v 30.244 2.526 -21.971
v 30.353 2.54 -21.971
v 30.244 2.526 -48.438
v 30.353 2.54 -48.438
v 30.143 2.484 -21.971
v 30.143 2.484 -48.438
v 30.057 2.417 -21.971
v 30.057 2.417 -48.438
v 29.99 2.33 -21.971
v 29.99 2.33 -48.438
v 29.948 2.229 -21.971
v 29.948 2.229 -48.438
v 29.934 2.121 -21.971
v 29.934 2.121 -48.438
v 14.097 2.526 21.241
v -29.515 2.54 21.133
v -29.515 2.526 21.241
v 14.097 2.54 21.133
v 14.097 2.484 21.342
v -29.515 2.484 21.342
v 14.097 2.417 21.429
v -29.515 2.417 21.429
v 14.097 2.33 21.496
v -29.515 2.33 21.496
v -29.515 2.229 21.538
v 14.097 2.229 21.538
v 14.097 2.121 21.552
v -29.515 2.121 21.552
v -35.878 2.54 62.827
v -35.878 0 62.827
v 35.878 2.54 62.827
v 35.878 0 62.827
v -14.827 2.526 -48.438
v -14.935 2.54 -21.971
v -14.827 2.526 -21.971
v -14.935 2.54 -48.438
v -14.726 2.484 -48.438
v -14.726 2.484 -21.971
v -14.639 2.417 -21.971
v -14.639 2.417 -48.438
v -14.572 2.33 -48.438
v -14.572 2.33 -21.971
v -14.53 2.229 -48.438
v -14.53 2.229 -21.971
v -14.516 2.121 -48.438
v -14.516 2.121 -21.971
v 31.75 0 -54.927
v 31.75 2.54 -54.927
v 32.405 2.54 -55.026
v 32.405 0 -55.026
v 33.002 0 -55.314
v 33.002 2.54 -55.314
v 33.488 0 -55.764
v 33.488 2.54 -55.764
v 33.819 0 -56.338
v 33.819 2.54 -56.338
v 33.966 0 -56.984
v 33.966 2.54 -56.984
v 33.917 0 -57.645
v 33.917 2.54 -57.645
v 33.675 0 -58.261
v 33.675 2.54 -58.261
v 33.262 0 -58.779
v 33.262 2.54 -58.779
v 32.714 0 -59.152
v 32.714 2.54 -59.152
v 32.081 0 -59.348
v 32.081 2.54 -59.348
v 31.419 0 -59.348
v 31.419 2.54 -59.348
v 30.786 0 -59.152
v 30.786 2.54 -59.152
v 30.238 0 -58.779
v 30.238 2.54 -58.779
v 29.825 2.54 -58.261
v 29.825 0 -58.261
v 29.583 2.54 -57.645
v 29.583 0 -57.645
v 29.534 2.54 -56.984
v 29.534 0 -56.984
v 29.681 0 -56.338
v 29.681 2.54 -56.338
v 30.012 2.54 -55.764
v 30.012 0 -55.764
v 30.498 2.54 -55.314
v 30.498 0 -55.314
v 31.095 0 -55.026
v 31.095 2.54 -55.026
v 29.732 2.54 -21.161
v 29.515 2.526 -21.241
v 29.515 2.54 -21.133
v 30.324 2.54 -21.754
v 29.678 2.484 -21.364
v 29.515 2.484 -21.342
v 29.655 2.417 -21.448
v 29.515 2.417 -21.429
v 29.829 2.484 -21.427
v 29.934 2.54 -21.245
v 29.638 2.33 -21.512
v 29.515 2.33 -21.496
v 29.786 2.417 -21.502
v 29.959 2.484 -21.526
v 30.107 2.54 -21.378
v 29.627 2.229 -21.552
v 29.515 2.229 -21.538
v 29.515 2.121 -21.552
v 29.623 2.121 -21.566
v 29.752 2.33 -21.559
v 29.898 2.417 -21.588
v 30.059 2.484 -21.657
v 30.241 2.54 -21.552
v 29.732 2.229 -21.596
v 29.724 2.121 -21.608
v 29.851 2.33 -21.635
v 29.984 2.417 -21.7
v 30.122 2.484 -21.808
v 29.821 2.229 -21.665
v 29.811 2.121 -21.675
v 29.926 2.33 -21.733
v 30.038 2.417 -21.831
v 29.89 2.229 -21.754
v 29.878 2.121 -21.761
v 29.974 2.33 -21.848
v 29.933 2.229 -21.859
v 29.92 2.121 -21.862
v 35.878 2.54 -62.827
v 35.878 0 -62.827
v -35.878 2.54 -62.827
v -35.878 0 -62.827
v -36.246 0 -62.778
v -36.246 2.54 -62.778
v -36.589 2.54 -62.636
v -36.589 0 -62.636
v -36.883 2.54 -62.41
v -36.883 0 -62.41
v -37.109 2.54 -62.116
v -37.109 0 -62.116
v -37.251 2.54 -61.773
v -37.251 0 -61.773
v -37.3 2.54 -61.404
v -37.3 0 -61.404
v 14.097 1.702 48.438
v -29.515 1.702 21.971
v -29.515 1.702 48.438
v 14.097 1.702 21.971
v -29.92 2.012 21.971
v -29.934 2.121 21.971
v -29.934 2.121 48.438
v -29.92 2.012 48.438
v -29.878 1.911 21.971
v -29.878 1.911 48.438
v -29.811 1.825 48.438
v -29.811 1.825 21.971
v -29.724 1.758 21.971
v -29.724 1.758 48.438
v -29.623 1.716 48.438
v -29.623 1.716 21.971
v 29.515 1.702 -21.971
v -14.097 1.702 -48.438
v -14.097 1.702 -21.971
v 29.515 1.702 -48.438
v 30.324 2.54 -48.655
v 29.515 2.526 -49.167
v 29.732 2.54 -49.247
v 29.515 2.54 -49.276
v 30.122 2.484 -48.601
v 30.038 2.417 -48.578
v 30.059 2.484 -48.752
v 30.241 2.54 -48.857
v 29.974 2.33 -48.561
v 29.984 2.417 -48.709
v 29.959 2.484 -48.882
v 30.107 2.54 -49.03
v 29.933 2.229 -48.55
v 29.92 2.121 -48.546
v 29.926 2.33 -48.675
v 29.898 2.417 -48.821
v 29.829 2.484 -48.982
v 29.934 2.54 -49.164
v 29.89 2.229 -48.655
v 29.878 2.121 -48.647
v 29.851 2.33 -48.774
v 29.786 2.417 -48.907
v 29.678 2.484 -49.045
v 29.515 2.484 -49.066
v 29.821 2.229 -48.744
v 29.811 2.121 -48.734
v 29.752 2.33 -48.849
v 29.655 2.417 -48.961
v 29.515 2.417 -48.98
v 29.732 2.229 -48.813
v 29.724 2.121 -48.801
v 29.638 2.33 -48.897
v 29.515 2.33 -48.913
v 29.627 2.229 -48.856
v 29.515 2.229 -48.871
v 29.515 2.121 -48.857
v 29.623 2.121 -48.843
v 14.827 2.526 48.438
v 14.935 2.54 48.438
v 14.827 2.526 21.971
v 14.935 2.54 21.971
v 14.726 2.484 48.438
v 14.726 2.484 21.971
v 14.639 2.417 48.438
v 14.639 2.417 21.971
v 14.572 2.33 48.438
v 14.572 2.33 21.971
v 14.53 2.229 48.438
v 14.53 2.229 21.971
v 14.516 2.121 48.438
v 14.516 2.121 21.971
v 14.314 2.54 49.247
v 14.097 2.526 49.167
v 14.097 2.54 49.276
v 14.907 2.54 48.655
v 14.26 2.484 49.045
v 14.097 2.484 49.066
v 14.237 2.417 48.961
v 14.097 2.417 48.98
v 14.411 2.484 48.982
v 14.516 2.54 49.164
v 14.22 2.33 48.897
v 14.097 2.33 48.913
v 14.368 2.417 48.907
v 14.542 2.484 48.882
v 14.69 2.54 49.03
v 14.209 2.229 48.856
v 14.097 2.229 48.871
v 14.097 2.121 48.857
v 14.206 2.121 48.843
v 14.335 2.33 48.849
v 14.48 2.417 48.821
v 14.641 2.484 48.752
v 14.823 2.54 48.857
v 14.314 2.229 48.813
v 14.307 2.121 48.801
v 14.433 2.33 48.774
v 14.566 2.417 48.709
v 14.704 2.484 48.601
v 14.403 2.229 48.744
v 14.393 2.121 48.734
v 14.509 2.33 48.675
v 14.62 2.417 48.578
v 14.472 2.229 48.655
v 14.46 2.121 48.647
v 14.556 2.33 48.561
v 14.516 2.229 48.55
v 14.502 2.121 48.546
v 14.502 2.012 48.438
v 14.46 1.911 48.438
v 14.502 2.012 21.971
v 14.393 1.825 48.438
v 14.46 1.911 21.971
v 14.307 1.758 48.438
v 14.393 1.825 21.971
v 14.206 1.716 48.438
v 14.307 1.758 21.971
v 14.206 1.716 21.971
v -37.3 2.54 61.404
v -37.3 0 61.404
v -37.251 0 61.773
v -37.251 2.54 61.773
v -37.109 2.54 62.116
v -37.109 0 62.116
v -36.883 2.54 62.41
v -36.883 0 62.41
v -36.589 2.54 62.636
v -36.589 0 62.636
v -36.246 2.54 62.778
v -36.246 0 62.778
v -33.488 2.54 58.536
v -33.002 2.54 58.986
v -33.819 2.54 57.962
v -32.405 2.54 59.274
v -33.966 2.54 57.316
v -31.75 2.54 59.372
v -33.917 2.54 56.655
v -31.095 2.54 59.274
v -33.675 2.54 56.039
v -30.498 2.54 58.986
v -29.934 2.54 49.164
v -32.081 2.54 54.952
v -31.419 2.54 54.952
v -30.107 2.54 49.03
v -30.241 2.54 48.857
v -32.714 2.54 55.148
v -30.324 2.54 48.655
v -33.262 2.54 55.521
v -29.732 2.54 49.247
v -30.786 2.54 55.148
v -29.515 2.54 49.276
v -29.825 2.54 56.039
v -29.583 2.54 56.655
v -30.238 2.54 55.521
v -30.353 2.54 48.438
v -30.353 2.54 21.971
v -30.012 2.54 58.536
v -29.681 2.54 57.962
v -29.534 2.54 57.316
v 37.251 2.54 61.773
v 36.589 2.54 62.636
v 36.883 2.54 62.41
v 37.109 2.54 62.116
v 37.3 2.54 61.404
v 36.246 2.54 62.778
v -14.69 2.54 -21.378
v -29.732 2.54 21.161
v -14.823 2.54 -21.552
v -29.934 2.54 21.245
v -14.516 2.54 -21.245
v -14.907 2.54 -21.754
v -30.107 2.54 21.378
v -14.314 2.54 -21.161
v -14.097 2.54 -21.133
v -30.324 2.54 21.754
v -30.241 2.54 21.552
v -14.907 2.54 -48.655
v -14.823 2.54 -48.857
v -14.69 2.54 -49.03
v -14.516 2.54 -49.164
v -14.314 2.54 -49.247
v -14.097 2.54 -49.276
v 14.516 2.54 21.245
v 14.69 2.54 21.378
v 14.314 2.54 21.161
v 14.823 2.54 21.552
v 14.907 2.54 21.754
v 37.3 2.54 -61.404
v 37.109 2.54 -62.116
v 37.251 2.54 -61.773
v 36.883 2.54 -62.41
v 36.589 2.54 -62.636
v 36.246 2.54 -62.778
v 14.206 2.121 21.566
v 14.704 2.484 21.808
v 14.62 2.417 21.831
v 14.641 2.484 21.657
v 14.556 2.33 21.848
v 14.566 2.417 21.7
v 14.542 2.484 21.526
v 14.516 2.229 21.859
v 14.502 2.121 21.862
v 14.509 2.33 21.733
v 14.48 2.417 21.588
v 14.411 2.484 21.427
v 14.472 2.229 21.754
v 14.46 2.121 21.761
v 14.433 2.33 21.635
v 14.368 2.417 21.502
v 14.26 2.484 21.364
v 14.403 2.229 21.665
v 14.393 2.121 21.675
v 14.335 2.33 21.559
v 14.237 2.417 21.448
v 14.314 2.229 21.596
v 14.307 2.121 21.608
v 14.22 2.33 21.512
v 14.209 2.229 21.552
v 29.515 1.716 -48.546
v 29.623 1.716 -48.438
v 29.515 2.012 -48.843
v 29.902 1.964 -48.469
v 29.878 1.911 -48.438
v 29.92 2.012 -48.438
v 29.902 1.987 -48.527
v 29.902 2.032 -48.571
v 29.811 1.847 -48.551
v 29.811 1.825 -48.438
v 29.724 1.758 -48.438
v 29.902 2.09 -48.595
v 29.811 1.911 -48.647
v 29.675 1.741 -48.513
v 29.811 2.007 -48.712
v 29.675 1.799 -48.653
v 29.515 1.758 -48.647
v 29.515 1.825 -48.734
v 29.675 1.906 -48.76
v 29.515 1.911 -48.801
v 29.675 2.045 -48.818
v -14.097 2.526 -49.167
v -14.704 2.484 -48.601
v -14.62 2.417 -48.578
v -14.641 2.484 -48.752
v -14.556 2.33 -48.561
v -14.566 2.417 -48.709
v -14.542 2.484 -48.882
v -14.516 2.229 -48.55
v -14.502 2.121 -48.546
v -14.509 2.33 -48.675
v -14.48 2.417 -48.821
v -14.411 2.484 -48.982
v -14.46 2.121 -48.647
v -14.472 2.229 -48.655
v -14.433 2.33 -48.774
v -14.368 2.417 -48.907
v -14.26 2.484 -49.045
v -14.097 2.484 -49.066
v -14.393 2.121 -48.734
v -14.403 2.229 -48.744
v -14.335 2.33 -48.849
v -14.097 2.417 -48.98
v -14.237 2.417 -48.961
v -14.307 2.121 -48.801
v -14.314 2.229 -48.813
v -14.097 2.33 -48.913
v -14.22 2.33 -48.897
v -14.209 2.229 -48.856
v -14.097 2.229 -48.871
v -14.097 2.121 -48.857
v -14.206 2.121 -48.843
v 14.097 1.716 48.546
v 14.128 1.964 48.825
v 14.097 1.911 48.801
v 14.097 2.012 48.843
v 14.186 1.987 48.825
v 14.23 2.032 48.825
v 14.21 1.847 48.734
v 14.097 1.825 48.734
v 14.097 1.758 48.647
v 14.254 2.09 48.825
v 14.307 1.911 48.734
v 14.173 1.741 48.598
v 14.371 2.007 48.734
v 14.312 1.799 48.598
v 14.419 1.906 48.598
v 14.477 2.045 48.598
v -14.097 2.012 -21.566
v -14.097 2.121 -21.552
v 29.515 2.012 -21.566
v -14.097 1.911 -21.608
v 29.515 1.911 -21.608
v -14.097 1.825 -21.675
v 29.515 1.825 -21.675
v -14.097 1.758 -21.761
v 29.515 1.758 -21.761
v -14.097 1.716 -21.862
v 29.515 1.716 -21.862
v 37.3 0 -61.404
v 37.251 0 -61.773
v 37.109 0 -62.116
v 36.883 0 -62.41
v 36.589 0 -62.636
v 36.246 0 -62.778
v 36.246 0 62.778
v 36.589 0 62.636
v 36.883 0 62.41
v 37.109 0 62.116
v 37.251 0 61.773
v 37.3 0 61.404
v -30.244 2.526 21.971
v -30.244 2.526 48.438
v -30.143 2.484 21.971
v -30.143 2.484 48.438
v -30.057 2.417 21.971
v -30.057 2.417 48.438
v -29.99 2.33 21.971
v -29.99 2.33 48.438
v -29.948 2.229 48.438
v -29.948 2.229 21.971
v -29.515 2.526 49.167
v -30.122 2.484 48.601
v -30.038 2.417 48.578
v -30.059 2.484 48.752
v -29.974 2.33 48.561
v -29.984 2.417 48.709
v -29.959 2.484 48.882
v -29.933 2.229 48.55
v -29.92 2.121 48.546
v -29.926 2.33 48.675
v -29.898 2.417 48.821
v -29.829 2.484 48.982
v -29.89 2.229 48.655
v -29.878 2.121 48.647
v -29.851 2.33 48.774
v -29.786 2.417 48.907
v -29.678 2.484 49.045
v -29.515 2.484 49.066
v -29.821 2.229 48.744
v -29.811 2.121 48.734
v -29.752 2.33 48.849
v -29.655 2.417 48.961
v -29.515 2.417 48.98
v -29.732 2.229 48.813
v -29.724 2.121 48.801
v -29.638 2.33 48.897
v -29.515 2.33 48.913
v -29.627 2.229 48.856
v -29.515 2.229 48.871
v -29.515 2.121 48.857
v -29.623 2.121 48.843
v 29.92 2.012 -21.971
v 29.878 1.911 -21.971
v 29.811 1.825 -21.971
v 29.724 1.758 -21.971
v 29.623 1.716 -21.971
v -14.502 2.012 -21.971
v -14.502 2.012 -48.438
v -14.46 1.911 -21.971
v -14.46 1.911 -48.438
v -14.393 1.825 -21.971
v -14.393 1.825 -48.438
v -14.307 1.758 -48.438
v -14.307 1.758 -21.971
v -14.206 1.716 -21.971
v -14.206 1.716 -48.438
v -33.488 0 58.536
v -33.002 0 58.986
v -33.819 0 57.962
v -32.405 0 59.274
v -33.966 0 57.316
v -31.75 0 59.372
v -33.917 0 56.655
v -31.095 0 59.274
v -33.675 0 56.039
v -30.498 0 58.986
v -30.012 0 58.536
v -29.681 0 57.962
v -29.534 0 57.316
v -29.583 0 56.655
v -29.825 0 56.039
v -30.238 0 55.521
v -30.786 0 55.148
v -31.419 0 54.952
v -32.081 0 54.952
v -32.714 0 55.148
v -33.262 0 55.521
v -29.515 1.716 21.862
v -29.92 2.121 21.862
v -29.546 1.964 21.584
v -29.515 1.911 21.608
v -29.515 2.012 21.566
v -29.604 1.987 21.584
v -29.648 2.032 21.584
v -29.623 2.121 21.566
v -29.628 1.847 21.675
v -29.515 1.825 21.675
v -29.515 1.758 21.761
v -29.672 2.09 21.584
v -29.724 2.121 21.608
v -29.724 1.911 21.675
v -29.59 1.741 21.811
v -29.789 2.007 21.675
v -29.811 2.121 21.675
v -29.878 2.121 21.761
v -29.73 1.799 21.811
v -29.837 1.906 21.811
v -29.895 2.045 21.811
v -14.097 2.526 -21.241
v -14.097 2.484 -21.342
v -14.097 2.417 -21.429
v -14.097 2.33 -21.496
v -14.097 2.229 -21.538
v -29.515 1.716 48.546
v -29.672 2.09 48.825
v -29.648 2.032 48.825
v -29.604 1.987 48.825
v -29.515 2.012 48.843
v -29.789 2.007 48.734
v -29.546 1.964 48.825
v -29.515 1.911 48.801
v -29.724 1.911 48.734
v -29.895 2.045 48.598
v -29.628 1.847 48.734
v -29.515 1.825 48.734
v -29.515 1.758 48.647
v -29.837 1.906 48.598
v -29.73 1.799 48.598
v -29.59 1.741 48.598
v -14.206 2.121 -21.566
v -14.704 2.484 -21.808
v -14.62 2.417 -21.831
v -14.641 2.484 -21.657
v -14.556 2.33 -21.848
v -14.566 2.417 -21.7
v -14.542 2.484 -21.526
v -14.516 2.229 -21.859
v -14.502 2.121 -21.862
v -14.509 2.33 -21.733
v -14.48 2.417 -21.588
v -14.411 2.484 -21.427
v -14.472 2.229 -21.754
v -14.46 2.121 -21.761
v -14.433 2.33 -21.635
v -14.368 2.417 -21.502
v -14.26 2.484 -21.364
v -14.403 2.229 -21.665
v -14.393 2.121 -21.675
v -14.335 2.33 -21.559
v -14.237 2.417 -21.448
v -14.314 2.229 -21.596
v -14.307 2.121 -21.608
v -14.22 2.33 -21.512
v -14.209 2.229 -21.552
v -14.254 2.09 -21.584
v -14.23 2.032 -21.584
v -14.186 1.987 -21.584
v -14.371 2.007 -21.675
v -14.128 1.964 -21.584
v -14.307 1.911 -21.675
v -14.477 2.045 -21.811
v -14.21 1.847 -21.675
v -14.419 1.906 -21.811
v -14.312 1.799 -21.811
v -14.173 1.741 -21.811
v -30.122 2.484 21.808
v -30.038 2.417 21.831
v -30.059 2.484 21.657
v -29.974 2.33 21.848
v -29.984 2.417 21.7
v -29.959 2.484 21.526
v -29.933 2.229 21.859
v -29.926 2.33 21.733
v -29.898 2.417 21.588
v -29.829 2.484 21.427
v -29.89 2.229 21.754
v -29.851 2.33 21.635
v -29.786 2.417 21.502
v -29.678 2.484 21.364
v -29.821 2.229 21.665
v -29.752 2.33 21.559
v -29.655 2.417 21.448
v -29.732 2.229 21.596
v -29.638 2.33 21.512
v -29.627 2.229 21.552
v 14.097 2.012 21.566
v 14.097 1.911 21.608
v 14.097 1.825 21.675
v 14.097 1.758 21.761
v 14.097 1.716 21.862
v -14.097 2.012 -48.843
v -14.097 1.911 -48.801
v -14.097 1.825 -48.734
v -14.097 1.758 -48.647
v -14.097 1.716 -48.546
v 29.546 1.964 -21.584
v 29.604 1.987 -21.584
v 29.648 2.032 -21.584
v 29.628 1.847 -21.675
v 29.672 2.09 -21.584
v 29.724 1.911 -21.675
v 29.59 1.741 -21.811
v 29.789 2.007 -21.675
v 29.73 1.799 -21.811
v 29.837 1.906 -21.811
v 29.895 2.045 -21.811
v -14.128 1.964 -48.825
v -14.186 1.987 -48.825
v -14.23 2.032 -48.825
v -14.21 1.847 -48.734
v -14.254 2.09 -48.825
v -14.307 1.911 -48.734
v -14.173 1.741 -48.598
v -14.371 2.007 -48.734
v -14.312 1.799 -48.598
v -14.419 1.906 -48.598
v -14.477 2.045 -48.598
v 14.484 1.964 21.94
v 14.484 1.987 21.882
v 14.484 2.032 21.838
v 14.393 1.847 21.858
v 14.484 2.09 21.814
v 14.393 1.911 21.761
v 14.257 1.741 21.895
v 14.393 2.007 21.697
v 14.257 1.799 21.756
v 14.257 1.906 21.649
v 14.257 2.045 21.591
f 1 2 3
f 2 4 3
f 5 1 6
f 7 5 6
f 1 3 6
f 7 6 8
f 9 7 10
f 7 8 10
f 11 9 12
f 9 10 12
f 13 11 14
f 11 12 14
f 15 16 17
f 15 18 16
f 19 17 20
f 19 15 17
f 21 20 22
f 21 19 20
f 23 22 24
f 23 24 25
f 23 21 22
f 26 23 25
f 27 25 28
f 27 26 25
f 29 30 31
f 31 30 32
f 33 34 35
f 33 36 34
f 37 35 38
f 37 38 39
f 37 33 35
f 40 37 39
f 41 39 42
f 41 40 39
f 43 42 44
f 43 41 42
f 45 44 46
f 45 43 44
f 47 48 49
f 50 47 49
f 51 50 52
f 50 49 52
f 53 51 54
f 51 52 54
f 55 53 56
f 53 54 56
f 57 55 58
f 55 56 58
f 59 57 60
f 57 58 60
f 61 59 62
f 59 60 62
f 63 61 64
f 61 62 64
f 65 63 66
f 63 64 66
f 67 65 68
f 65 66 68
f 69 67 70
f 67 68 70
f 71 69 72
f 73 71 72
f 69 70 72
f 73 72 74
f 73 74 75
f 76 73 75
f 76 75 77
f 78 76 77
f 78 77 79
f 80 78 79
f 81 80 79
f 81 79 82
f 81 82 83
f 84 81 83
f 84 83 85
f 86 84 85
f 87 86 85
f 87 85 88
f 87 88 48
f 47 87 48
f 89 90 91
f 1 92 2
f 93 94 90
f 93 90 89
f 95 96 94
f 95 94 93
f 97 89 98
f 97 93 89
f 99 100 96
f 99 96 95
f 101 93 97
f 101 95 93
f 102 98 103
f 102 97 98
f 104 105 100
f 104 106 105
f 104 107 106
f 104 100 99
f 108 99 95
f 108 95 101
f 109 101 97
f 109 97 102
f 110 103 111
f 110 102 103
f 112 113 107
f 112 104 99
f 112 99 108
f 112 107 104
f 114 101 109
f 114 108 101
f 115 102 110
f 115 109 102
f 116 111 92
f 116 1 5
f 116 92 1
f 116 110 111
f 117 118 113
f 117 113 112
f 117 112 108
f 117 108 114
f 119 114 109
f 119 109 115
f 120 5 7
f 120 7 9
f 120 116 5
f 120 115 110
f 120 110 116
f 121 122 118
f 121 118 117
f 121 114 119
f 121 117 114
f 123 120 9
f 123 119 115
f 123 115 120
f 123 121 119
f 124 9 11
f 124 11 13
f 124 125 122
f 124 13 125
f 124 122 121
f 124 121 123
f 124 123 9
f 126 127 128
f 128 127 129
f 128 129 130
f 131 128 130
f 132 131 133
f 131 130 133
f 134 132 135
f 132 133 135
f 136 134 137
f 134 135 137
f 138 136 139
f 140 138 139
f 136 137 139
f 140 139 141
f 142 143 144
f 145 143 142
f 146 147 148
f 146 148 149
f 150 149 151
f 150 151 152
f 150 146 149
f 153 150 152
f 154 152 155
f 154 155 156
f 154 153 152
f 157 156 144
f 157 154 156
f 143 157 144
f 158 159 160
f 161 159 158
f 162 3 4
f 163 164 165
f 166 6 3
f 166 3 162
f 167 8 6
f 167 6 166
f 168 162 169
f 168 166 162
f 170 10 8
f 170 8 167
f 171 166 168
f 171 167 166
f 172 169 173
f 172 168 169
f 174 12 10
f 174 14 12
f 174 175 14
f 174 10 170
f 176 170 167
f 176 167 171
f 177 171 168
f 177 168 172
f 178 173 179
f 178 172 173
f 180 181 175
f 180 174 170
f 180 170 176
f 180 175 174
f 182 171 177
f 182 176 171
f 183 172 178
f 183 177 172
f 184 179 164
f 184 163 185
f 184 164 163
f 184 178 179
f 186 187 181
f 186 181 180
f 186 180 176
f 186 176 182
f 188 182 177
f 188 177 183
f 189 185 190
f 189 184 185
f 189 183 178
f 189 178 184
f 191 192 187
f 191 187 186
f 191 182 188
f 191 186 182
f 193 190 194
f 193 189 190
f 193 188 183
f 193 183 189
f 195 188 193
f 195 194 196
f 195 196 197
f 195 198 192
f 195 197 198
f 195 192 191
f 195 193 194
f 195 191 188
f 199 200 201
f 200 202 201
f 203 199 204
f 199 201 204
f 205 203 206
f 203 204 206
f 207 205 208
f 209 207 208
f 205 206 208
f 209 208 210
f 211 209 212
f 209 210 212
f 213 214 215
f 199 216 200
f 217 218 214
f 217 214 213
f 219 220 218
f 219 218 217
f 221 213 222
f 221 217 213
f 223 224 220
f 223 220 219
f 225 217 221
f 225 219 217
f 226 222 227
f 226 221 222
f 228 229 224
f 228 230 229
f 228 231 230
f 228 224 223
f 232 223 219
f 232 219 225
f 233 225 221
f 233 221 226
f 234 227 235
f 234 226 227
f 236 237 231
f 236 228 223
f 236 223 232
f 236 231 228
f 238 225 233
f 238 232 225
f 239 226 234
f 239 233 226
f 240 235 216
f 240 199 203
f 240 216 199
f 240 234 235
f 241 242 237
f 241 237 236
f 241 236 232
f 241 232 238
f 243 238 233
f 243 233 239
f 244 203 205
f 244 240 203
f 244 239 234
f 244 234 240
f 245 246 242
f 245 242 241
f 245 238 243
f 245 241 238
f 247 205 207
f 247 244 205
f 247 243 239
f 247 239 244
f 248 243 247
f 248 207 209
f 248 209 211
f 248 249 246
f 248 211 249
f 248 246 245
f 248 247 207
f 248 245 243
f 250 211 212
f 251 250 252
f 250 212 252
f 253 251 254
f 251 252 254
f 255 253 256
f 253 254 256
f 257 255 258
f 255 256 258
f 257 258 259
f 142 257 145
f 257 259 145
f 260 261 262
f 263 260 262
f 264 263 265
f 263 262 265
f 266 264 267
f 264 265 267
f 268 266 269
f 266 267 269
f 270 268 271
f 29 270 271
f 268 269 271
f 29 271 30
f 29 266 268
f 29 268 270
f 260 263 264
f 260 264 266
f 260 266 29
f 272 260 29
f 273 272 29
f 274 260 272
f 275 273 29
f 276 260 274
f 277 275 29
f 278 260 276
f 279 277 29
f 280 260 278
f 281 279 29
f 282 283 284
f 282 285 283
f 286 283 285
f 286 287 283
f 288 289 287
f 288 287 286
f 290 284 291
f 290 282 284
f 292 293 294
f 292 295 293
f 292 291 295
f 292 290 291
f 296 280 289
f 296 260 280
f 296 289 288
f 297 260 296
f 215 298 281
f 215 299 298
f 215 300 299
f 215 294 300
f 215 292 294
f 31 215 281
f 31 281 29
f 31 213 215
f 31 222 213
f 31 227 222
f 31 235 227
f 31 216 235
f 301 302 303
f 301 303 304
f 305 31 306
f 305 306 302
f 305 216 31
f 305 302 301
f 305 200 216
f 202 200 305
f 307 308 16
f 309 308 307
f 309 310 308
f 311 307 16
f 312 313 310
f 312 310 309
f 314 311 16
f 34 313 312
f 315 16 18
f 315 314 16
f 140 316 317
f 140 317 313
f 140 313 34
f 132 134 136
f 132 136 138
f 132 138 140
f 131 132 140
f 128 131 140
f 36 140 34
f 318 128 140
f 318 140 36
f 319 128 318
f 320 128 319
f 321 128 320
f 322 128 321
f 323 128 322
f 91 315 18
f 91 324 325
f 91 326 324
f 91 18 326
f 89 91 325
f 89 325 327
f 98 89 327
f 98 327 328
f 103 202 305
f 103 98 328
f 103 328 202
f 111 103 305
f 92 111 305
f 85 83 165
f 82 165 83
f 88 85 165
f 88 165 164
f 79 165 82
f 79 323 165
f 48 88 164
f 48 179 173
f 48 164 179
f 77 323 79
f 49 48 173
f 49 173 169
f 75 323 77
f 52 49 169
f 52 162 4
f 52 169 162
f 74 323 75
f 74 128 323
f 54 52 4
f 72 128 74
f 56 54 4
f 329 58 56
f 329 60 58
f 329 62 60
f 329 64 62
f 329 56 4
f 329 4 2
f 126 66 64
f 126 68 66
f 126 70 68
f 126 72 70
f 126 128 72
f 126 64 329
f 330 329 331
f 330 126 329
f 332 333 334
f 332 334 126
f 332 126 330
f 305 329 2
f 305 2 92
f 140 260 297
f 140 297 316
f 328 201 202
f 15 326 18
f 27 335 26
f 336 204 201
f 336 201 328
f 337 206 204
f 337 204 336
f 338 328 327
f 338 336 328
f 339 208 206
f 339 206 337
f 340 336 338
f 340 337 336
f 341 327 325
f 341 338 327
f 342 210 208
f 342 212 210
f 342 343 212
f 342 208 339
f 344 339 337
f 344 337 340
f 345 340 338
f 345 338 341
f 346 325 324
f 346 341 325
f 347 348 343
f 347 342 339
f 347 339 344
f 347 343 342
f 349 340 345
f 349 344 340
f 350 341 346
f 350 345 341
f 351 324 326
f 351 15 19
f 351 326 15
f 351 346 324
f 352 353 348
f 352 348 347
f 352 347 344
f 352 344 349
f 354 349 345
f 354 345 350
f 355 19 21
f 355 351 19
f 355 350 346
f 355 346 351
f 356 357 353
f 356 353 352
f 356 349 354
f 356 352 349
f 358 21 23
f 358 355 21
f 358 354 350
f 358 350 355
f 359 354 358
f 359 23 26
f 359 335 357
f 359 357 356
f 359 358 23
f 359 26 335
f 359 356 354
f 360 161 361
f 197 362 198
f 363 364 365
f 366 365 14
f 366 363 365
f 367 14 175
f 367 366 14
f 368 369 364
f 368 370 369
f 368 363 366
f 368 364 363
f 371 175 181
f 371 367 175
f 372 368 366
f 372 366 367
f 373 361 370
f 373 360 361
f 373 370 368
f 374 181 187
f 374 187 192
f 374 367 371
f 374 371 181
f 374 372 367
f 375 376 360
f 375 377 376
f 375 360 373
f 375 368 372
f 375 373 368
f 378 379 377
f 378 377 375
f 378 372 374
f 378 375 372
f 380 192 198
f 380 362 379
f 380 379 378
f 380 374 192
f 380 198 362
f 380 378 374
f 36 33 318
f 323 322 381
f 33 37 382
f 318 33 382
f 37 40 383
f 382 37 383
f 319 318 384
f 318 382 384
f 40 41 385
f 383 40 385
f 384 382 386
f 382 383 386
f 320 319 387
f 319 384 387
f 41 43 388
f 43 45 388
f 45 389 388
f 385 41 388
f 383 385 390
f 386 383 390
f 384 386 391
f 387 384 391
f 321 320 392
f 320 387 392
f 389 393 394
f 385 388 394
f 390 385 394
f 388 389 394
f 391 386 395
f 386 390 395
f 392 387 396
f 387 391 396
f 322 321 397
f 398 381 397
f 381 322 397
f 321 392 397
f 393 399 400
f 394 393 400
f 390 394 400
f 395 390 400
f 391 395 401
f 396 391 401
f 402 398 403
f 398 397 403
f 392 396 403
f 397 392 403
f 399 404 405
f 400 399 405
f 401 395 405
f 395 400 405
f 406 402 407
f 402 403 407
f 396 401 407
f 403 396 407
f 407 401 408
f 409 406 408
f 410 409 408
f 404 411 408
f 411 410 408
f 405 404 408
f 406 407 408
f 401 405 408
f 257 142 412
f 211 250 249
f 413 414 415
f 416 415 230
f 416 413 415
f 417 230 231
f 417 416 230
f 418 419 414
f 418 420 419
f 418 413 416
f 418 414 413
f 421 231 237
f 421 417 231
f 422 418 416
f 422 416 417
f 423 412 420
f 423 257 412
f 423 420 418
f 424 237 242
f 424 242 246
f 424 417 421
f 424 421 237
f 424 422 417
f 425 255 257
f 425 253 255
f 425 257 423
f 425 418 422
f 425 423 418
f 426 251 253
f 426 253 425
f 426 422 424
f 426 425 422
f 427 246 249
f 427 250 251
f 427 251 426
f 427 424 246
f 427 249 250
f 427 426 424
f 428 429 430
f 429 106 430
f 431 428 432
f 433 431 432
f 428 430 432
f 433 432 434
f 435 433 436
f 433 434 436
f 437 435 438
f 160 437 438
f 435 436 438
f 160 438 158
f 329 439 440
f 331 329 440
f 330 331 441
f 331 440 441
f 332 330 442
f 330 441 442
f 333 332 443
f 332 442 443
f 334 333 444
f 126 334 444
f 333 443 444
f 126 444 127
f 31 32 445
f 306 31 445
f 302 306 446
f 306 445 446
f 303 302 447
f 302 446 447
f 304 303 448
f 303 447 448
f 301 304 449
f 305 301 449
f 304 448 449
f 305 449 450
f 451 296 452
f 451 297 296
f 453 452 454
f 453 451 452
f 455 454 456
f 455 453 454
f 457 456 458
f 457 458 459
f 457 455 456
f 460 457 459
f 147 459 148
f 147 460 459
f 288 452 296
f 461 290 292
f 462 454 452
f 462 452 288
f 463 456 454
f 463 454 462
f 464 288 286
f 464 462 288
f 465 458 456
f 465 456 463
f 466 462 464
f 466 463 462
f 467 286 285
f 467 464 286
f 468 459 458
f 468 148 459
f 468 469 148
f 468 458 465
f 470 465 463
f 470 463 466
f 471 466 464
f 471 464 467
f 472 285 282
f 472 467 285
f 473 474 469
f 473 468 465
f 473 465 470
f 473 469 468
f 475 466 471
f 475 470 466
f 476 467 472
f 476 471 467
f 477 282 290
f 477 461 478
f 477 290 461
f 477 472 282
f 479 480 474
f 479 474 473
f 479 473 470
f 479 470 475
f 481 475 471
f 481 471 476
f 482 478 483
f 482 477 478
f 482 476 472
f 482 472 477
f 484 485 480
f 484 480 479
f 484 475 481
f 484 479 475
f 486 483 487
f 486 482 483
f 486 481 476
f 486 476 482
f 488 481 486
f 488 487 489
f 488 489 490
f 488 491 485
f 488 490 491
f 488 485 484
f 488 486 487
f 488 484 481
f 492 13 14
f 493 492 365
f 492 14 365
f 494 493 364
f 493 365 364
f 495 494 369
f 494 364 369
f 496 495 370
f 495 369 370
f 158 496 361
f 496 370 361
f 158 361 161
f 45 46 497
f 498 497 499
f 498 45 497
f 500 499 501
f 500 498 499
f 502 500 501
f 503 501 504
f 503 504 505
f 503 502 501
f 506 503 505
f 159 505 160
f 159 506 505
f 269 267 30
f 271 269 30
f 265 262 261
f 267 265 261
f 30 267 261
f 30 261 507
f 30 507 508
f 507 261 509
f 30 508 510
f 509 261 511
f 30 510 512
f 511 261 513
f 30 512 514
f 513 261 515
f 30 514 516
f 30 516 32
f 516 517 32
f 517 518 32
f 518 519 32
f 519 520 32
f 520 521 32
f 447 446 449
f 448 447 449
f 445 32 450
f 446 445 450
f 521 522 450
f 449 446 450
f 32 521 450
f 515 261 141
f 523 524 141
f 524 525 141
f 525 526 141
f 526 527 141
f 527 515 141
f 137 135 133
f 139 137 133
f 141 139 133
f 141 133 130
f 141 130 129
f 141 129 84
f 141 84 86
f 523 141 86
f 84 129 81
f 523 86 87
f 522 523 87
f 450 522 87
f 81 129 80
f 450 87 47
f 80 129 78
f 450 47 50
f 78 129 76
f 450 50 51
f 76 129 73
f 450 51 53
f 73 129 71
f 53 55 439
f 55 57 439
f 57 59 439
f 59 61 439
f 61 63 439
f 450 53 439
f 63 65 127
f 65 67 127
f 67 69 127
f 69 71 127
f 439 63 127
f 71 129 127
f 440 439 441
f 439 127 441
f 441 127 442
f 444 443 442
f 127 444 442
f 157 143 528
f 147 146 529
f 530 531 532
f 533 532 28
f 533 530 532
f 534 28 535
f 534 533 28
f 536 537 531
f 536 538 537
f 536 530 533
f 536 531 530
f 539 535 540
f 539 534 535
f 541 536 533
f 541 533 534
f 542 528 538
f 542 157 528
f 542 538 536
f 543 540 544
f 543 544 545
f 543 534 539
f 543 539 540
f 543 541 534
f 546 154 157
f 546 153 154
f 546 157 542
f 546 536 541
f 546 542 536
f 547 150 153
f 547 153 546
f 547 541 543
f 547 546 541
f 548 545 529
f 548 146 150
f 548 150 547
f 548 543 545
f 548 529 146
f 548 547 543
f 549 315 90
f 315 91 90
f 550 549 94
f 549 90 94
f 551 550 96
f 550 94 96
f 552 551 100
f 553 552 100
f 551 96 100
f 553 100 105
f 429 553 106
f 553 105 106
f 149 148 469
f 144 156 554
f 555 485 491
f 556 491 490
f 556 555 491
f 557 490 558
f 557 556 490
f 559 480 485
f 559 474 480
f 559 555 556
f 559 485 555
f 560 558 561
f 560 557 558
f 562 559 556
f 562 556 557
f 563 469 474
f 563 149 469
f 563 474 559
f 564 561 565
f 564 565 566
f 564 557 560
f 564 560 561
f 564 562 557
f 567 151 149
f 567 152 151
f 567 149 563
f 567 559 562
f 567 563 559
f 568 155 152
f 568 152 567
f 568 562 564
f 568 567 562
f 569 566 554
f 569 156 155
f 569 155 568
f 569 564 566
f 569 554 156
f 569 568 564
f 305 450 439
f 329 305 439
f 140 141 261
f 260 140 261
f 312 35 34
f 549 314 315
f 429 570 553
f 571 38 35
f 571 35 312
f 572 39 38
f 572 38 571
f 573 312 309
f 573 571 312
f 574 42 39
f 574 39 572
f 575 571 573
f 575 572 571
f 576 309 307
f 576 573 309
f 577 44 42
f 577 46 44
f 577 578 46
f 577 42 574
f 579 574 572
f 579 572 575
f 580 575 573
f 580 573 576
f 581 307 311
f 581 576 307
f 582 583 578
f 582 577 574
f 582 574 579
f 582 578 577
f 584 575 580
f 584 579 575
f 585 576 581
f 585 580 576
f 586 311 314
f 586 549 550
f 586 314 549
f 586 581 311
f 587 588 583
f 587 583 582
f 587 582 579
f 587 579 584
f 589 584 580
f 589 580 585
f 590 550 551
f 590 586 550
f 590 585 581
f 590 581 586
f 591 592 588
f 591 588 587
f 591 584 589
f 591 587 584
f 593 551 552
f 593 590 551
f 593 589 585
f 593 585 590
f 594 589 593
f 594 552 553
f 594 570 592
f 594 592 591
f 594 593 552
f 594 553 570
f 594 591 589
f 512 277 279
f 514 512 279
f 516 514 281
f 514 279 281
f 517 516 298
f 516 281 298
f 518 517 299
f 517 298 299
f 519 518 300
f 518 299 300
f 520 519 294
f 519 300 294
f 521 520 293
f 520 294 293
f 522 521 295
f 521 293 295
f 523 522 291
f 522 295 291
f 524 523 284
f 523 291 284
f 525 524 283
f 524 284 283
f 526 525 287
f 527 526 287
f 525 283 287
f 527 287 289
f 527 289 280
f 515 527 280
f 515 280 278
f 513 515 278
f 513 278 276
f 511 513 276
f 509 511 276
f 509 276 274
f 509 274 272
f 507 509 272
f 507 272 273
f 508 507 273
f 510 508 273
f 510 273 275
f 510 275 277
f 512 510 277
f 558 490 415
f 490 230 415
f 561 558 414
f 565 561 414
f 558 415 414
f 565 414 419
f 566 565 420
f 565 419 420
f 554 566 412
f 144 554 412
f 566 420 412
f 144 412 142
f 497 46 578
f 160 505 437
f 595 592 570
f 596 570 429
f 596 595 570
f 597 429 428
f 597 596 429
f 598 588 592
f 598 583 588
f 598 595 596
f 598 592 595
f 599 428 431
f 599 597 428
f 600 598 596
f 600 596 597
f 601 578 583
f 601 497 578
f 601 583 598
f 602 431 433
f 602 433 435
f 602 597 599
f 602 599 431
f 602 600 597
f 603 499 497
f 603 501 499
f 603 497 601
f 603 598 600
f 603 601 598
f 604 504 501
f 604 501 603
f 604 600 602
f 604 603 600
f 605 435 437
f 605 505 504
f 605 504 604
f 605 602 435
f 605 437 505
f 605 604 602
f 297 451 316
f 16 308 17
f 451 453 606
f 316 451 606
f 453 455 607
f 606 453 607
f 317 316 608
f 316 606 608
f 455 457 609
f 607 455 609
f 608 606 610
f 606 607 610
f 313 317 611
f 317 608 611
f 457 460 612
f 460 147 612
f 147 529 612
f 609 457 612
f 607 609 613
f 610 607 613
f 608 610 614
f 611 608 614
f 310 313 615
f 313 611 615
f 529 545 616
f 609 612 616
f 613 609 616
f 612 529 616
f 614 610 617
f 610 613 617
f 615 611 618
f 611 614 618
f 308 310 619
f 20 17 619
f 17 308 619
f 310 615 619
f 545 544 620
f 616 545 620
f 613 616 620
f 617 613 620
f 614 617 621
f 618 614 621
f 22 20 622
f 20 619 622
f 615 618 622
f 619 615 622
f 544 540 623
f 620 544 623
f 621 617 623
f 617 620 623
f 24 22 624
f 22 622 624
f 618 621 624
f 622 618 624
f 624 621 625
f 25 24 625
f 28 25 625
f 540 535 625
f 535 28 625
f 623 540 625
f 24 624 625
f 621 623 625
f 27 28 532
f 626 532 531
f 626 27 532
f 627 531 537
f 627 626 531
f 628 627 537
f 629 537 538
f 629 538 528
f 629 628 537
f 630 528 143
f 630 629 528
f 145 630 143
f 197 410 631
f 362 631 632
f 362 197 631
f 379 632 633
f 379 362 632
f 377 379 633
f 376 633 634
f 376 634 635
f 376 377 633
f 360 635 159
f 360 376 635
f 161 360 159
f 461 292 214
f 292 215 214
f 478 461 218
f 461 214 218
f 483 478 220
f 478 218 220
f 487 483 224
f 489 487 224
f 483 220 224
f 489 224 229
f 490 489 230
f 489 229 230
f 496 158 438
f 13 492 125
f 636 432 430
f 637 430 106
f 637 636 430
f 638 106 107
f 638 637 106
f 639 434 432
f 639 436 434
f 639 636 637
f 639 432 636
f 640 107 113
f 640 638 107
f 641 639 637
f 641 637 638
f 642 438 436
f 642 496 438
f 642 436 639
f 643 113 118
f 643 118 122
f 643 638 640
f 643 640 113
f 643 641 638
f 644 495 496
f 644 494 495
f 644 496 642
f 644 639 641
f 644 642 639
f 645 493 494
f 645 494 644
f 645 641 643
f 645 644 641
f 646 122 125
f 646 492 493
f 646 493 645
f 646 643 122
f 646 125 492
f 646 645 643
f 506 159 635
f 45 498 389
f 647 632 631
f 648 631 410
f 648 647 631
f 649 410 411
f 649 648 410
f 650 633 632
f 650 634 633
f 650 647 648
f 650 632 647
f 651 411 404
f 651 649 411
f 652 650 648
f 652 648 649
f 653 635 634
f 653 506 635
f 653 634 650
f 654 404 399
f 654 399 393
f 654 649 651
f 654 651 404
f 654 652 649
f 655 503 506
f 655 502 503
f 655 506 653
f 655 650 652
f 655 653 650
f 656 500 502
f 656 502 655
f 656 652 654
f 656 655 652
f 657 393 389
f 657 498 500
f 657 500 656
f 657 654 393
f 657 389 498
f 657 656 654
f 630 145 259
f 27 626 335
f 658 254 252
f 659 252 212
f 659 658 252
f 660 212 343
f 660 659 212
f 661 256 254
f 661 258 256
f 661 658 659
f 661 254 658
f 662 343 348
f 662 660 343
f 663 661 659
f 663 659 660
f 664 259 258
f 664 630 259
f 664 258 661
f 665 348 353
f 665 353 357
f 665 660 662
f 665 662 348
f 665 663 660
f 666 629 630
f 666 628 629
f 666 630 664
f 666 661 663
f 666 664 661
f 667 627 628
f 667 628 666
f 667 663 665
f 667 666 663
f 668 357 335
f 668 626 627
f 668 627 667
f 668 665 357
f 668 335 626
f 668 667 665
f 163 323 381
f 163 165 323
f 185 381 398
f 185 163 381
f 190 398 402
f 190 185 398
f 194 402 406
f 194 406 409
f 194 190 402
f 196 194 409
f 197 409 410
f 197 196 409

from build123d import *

# Parameters (mm, degrees)
EXTRUDE1_DEPTH     = 2.54
SKETCH2_W          = 44.45
SKETCH2_H          = 27.305
EXTRUDE2_DEPTH     = 0.8382
FILLET1_R          = 0.4191
SKETCH3_R          = 2.2225
CUT_EXTRUDE1_DEPTH = 74.109188914


with BuildPart() as part:
    # Sketch1 → Extrude1 (new body)
    with BuildSketch(Plane(origin=(0, 0, 0), x_dir=(1, 0, 0), z_dir=(0, 1, 0))):
        with BuildLine():
            Line((-35.8775, -62.8269), (35.8775, -62.8269))
            ThreePointArc((35.8775, -62.8269), (36.883288686, -62.410288686), (37.2999, -61.4045))
            Line((37.2999, -61.4045), (37.2999, 61.4045))
            ThreePointArc((37.2999, 61.4045), (36.883288686, 62.410288686), (35.8775, 62.8269))
            Line((35.8775, 62.8269), (-35.8775, 62.8269))
            ThreePointArc((-35.8775, 62.8269), (-36.883288686, 62.410288686), (-37.2999, 61.4045))
            Line((-37.2999, 61.4045), (-37.2999, -61.4045))
            ThreePointArc((-37.2999, -61.4045), (-36.883288686, -62.410288686), (-35.8775, -62.8269))
        make_face()
    extrude(amount=EXTRUDE1_DEPTH)

    # Sketch2 → Extrude2 (cut)
    with BuildSketch(Plane(origin=(0, 2.54, 0), x_dir=(1, 0, 0), z_dir=(0, 1, 0))):
        with Locations((7.7089, 35.2044)):
            Rectangle(SKETCH2_W, SKETCH2_H)
        with Locations((-7.7089, -35.2044)):
            Rectangle(SKETCH2_W, SKETCH2_H)
    extrude(amount=-EXTRUDE2_DEPTH, mode=Mode.SUBTRACT)

    # Fillet1
    fillet1_edges = [part.edges().sort_by_distance(p)[0] for p in [
        (-14.5161, 1.7018, -35.2044),
        (-14.5161, 2.1209, -21.5519),
        (7.7089, 1.7018, -48.8569),
        (-14.5161, 2.1209, -48.8569),
        (29.9339, 1.7018, -35.2044),
        (29.9339, 2.1209, -48.8569),
        (7.7089, 1.7018, -21.5519),
        (29.9339, 2.1209, -21.5519),
        (-14.5161, 2.54, -35.2044),
        (7.7089, 2.54, -21.5519),
        (29.9339, 2.54, -35.2044),
        (7.7089, 2.54, -48.8569),
        (-29.9339, 1.7018, 35.2044),
        (-29.9339, 2.1209, 48.8569),
        (-7.7089, 1.7018, 21.5519),
        (-29.9339, 2.1209, 21.5519),
        (14.5161, 1.7018, 35.2044),
        (14.5161, 2.1209, 21.5519),
        (-7.7089, 1.7018, 48.8569),
        (14.5161, 2.1209, 48.8569),
        (-29.9339, 2.54, 35.2044),
        (-7.7089, 2.54, 48.8569),
        (14.5161, 2.54, 35.2044),
        (-7.7089, 2.54, 21.5519),
    ]]
    fillet(fillet1_edges, radius=FILLET1_R - 0.0001)  # a hair under: the kernel refuses the full size

    # Sketch3 → Cut-Extrude1 (cut, through all)
    with BuildSketch(Plane(origin=(0, 2.54, 0), x_dir=(1, 0, 0), z_dir=(0, 1, 0))):
        with Locations(Location((31.75, 57.15, 0), (0, 0, 270))):
            Circle(SKETCH3_R)
        with Locations(Location((-31.75, -57.15, 0), (0, 0, 270))):
            Circle(SKETCH3_R)
    extrude(amount=-CUT_EXTRUDE1_DEPTH, mode=Mode.SUBTRACT)


solid = part.part
